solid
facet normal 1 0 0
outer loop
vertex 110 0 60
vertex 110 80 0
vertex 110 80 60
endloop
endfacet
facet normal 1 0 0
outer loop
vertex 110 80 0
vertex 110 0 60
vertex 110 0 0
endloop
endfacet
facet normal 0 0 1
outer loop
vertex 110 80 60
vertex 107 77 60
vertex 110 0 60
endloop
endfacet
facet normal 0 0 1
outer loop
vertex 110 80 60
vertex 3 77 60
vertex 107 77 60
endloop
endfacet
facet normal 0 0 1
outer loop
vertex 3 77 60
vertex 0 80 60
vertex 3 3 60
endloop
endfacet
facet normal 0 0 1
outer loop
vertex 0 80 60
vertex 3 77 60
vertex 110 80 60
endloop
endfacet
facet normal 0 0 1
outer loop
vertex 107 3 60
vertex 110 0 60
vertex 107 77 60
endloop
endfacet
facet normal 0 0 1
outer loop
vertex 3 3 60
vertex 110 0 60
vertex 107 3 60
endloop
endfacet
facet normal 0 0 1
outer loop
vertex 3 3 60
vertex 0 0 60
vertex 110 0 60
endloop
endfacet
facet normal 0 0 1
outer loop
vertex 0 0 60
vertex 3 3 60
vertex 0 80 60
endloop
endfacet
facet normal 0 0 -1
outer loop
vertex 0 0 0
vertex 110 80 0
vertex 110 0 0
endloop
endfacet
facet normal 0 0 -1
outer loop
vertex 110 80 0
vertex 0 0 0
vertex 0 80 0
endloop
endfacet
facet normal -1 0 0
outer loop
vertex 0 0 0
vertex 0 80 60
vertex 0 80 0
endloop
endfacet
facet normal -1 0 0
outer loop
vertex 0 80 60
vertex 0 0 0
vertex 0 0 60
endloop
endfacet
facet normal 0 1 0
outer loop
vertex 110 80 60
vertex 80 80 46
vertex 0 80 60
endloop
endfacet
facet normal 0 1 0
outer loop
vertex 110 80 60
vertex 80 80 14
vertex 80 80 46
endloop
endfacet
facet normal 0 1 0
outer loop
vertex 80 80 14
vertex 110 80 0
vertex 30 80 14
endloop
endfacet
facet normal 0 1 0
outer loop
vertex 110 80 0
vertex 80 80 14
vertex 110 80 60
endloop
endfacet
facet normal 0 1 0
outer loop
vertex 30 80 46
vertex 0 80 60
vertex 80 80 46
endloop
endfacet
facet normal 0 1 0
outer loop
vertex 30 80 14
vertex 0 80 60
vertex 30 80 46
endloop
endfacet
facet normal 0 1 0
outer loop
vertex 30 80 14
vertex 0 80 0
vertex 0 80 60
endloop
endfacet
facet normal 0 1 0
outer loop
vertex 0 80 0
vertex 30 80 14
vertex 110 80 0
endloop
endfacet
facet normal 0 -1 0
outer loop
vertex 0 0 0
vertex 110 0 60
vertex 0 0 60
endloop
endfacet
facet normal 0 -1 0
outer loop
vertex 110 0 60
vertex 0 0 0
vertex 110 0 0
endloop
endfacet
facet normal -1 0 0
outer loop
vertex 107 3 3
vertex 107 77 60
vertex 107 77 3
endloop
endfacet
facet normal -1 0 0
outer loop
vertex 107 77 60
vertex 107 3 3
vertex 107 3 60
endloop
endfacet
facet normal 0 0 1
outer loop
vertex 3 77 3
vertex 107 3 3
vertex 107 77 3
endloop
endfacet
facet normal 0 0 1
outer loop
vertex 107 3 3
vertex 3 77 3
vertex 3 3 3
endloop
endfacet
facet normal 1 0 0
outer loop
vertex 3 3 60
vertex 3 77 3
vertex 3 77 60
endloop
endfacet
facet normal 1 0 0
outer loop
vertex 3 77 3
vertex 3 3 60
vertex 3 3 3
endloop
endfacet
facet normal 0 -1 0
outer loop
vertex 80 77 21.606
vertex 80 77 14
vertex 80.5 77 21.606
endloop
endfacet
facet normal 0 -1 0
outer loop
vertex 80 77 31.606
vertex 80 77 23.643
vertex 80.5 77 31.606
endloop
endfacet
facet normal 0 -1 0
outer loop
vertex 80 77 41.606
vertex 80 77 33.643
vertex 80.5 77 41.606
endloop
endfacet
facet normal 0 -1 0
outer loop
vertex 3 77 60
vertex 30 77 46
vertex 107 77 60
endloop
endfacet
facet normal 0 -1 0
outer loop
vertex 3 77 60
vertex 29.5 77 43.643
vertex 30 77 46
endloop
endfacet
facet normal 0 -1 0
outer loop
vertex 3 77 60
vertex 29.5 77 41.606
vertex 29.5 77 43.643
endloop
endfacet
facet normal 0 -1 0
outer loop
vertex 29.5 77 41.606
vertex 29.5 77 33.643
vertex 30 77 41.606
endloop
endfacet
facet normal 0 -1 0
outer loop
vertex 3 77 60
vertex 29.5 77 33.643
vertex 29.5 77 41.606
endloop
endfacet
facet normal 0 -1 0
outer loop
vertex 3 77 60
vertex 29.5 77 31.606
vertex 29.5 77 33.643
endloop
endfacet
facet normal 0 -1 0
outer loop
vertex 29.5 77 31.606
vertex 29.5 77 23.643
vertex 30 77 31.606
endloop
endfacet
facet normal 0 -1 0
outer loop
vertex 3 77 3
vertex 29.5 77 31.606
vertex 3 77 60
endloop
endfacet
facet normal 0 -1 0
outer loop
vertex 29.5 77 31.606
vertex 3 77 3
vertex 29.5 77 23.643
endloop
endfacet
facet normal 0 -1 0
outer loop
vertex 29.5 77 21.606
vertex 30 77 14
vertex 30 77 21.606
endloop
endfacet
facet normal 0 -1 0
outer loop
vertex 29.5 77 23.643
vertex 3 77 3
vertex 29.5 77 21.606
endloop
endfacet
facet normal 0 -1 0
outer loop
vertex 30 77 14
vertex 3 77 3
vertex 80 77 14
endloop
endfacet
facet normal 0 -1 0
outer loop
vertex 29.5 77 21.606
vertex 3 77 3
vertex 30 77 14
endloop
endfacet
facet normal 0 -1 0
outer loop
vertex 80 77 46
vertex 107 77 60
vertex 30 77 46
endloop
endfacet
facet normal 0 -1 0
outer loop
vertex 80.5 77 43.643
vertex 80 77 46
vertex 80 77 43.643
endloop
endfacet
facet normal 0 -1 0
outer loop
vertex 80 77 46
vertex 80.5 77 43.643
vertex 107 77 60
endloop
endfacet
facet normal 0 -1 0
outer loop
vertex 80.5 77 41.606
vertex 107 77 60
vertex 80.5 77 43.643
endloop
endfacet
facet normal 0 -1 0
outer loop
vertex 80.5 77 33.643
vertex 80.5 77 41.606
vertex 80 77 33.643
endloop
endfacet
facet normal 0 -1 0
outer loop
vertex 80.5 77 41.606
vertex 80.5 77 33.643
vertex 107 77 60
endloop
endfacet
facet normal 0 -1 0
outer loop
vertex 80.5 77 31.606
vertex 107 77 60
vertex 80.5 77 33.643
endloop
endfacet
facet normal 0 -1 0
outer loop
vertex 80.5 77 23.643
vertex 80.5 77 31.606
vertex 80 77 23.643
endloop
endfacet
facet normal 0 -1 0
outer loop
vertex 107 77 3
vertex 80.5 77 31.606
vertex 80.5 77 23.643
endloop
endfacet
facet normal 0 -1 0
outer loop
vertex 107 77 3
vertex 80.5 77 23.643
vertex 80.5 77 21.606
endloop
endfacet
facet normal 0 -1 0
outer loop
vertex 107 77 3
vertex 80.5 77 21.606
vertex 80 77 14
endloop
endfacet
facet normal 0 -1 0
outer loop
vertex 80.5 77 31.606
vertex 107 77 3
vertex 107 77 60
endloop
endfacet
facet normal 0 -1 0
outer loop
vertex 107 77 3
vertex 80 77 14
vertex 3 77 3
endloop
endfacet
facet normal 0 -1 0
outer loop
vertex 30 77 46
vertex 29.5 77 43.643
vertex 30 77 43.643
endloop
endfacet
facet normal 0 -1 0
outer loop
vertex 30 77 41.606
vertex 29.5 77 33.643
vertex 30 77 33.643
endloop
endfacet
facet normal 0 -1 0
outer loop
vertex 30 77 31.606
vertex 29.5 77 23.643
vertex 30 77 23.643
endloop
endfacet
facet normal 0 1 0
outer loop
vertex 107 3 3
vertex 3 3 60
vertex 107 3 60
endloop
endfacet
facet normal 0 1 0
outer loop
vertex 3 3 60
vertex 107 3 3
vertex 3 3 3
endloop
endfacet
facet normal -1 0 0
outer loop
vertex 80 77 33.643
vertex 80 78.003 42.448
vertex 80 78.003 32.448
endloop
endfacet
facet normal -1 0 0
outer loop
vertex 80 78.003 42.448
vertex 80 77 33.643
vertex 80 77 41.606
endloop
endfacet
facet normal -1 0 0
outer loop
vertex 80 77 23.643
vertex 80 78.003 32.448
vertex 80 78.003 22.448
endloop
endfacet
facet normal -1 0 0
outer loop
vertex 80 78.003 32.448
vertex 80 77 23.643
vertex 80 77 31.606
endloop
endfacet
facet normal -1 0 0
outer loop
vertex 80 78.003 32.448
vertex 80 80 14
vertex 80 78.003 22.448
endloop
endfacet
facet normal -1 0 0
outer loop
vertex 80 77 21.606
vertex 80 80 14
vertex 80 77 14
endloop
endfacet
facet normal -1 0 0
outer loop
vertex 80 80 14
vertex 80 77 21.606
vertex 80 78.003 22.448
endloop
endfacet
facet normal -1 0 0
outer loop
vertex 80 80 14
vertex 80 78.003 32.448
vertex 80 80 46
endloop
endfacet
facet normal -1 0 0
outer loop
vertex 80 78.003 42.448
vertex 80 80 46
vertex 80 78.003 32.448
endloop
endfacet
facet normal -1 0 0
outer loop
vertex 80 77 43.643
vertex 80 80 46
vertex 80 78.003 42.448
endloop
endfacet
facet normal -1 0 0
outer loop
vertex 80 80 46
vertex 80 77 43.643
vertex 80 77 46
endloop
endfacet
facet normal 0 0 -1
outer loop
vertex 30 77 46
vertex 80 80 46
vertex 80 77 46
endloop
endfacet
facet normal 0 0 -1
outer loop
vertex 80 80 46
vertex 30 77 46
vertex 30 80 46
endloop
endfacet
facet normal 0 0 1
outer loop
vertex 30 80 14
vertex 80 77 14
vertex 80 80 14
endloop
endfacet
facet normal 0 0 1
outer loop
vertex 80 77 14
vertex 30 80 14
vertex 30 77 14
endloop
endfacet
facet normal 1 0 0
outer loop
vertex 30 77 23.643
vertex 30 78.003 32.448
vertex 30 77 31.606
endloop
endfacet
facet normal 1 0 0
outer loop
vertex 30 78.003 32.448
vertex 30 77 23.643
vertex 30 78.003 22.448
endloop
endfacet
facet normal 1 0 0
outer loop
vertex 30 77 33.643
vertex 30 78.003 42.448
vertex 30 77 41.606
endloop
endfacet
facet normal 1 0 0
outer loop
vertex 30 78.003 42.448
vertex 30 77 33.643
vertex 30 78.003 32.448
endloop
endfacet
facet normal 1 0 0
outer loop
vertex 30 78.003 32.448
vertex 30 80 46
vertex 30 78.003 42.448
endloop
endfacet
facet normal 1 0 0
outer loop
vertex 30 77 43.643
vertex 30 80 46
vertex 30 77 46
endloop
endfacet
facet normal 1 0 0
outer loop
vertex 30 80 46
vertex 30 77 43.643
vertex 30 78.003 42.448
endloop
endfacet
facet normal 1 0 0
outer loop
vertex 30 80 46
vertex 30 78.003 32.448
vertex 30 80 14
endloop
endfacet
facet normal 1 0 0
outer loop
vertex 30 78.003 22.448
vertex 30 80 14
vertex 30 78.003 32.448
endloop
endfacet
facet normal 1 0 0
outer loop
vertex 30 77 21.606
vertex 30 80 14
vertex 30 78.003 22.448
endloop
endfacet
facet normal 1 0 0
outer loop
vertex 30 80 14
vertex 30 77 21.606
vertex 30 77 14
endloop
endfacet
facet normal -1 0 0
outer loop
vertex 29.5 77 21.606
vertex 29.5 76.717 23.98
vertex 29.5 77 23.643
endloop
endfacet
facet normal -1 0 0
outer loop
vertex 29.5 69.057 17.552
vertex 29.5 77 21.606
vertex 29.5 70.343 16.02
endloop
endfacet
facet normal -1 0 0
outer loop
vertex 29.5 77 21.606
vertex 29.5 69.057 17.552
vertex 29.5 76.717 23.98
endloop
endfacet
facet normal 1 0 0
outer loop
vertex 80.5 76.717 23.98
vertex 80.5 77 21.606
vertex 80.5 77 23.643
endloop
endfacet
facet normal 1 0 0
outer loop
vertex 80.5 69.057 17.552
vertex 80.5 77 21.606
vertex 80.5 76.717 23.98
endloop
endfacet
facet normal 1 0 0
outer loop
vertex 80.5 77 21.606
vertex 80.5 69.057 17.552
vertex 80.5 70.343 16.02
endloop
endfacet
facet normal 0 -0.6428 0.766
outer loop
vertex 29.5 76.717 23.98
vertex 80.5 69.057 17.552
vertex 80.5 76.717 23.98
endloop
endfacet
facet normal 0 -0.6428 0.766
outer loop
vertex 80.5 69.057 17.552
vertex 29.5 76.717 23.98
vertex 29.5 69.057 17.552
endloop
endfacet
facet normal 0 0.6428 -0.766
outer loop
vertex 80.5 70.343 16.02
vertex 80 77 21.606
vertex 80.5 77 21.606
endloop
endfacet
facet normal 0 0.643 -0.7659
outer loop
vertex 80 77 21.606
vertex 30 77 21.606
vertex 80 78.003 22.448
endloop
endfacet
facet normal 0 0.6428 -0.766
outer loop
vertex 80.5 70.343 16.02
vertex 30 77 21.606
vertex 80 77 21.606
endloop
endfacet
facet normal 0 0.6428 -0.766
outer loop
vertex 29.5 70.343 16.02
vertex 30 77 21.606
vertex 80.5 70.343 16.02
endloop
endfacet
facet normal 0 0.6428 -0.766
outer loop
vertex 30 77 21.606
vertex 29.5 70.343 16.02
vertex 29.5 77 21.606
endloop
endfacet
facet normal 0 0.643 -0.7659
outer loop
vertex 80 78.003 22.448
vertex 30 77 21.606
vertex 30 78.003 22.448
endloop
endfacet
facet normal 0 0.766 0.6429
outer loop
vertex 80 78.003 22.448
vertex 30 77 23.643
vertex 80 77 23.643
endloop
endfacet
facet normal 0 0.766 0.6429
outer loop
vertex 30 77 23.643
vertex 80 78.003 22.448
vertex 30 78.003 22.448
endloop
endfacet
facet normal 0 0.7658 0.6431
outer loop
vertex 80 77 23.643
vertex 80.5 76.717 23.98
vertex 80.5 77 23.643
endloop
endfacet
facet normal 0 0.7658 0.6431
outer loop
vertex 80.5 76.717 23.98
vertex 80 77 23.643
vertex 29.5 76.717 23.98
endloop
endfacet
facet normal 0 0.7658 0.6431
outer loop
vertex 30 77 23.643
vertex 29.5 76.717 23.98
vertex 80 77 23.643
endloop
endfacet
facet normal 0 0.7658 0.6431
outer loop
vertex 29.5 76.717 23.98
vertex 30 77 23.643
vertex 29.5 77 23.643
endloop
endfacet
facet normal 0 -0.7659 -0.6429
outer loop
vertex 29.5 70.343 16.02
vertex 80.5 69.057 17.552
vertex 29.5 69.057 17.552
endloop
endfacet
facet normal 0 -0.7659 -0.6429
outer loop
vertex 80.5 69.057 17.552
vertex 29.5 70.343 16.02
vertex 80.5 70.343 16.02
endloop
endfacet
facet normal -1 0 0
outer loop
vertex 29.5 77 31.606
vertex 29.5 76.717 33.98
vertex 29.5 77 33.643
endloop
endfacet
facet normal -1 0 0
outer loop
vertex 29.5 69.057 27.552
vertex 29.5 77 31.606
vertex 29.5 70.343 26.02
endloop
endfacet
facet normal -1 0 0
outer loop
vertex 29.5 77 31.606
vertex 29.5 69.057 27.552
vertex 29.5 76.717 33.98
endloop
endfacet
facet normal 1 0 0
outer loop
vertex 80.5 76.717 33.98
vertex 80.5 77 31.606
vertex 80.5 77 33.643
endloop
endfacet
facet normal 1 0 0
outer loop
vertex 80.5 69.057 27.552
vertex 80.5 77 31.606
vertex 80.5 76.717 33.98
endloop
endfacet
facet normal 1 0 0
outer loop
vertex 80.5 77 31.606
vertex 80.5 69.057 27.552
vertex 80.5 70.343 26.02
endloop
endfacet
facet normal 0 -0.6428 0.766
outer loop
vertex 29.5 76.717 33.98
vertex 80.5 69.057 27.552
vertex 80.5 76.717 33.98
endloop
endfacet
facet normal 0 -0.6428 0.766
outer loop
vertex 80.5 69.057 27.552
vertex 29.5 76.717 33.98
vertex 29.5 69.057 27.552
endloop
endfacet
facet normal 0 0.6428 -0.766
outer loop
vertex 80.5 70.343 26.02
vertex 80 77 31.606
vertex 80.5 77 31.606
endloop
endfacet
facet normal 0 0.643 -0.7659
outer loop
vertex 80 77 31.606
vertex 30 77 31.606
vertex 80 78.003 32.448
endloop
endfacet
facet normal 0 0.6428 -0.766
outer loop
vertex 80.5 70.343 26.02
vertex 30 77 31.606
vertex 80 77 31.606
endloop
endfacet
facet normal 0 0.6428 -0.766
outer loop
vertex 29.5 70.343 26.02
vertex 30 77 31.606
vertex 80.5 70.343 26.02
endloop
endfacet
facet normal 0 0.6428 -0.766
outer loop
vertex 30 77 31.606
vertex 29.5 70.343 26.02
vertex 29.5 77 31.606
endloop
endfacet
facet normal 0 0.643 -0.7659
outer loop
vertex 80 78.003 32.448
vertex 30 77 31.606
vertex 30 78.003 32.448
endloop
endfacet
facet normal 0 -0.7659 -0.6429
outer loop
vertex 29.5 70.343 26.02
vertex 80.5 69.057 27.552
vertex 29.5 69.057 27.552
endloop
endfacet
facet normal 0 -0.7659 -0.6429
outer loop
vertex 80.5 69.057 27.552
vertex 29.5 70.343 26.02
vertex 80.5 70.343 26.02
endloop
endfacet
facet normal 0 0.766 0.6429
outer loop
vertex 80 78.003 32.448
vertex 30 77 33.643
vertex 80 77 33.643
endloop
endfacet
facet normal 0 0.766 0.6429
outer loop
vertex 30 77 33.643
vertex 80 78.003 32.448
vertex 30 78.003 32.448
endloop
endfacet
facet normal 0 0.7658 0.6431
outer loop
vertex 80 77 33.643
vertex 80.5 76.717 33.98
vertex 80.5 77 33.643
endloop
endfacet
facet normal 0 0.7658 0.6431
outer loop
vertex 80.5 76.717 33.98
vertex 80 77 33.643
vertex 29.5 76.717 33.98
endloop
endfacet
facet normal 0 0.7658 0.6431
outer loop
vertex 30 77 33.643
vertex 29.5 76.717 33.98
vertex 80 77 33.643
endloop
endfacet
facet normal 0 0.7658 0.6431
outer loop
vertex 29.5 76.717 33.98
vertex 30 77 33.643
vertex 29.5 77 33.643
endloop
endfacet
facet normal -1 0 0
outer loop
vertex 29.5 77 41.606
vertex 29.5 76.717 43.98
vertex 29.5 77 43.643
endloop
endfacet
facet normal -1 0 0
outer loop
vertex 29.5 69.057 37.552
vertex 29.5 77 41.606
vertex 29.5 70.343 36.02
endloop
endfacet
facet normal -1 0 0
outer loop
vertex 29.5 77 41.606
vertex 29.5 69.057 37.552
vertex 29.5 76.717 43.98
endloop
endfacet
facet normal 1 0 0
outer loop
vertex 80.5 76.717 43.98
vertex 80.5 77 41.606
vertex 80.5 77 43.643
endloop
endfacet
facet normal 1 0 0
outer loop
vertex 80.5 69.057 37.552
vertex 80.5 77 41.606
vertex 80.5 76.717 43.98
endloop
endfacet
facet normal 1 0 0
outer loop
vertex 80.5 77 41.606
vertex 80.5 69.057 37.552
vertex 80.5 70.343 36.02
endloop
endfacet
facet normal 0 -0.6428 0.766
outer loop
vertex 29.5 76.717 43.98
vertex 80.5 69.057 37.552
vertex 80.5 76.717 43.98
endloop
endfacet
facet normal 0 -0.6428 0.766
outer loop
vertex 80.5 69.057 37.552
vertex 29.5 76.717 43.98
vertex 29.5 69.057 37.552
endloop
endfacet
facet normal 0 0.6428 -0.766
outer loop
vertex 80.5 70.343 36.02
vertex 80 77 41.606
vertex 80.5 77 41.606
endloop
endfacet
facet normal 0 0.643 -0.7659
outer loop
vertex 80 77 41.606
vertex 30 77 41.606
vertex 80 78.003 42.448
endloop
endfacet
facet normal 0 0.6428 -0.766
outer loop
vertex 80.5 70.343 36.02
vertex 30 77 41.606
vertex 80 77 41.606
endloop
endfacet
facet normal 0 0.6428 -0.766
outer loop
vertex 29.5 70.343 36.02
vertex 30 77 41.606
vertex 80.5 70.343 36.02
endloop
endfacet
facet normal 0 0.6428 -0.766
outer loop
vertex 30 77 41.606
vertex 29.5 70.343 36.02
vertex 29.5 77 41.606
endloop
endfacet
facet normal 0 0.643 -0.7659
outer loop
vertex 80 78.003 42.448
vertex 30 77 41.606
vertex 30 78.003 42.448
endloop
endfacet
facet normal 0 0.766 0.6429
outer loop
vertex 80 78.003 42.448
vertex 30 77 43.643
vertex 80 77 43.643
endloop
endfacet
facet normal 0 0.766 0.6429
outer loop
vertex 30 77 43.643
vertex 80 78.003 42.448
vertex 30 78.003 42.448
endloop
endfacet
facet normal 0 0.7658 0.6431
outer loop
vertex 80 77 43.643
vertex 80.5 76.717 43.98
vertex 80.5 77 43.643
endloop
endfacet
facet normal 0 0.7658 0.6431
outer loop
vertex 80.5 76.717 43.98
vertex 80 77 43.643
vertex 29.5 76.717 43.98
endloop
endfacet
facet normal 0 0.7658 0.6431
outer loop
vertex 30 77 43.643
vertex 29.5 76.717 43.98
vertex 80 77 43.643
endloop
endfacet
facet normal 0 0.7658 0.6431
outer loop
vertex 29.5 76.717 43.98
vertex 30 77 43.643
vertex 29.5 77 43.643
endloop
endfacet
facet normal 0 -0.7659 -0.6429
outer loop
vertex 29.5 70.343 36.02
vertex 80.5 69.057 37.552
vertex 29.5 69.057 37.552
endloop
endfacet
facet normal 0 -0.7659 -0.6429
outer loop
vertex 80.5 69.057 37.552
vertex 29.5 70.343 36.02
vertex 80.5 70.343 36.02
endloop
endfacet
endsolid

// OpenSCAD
$fn = 32;

// ----------------------------------------------------------------------
// Vent box: louvers enclosure
// ----------------------------------------------------------------------

// --- parameters (mm) ---
box_l = 110;              // box length, X
box_w = 80;               // box width, Y
box_h = 60;               // box height, Z
wall_t = 3;               // shell wall thickness
win_l = 50;               // vent window width, X
win_h = 32;               // vent window height, Z
slat_t = 2;               // louver slat thickness
slat_d = 10;              // louver slat depth
slat_a = 40;              // louver slat angle, degrees
slat_pitch = 10;          // louver pitch
slat_yc = 73.53;          // slat centreline Y

win_z0 = (box_h - win_h) / 2;  // window lower edge Z
n_slats = 3;  // louver count
slat_z0 = win_z0 + (win_h - (n_slats - 1) * slat_pitch) / 2;

difference() {
  union() {
    difference() {
      cube([box_l, box_w, box_h]);
  translate([wall_t, wall_t, wall_t])
    cube([box_l - 2 * wall_t, box_w - 2 * wall_t, box_h]);
  translate([(box_l - win_l) / 2, box_w - wall_t - 1, win_z0])
    cube([win_l, wall_t + 2, win_h]);
    }
    for (i = [0 : n_slats - 1])
      translate([box_l / 2, slat_yc, slat_z0 + i * slat_pitch])
        rotate([slat_a, 0, 0])
          cube([win_l + 1, slat_d, slat_t], center = true);
  }
}
